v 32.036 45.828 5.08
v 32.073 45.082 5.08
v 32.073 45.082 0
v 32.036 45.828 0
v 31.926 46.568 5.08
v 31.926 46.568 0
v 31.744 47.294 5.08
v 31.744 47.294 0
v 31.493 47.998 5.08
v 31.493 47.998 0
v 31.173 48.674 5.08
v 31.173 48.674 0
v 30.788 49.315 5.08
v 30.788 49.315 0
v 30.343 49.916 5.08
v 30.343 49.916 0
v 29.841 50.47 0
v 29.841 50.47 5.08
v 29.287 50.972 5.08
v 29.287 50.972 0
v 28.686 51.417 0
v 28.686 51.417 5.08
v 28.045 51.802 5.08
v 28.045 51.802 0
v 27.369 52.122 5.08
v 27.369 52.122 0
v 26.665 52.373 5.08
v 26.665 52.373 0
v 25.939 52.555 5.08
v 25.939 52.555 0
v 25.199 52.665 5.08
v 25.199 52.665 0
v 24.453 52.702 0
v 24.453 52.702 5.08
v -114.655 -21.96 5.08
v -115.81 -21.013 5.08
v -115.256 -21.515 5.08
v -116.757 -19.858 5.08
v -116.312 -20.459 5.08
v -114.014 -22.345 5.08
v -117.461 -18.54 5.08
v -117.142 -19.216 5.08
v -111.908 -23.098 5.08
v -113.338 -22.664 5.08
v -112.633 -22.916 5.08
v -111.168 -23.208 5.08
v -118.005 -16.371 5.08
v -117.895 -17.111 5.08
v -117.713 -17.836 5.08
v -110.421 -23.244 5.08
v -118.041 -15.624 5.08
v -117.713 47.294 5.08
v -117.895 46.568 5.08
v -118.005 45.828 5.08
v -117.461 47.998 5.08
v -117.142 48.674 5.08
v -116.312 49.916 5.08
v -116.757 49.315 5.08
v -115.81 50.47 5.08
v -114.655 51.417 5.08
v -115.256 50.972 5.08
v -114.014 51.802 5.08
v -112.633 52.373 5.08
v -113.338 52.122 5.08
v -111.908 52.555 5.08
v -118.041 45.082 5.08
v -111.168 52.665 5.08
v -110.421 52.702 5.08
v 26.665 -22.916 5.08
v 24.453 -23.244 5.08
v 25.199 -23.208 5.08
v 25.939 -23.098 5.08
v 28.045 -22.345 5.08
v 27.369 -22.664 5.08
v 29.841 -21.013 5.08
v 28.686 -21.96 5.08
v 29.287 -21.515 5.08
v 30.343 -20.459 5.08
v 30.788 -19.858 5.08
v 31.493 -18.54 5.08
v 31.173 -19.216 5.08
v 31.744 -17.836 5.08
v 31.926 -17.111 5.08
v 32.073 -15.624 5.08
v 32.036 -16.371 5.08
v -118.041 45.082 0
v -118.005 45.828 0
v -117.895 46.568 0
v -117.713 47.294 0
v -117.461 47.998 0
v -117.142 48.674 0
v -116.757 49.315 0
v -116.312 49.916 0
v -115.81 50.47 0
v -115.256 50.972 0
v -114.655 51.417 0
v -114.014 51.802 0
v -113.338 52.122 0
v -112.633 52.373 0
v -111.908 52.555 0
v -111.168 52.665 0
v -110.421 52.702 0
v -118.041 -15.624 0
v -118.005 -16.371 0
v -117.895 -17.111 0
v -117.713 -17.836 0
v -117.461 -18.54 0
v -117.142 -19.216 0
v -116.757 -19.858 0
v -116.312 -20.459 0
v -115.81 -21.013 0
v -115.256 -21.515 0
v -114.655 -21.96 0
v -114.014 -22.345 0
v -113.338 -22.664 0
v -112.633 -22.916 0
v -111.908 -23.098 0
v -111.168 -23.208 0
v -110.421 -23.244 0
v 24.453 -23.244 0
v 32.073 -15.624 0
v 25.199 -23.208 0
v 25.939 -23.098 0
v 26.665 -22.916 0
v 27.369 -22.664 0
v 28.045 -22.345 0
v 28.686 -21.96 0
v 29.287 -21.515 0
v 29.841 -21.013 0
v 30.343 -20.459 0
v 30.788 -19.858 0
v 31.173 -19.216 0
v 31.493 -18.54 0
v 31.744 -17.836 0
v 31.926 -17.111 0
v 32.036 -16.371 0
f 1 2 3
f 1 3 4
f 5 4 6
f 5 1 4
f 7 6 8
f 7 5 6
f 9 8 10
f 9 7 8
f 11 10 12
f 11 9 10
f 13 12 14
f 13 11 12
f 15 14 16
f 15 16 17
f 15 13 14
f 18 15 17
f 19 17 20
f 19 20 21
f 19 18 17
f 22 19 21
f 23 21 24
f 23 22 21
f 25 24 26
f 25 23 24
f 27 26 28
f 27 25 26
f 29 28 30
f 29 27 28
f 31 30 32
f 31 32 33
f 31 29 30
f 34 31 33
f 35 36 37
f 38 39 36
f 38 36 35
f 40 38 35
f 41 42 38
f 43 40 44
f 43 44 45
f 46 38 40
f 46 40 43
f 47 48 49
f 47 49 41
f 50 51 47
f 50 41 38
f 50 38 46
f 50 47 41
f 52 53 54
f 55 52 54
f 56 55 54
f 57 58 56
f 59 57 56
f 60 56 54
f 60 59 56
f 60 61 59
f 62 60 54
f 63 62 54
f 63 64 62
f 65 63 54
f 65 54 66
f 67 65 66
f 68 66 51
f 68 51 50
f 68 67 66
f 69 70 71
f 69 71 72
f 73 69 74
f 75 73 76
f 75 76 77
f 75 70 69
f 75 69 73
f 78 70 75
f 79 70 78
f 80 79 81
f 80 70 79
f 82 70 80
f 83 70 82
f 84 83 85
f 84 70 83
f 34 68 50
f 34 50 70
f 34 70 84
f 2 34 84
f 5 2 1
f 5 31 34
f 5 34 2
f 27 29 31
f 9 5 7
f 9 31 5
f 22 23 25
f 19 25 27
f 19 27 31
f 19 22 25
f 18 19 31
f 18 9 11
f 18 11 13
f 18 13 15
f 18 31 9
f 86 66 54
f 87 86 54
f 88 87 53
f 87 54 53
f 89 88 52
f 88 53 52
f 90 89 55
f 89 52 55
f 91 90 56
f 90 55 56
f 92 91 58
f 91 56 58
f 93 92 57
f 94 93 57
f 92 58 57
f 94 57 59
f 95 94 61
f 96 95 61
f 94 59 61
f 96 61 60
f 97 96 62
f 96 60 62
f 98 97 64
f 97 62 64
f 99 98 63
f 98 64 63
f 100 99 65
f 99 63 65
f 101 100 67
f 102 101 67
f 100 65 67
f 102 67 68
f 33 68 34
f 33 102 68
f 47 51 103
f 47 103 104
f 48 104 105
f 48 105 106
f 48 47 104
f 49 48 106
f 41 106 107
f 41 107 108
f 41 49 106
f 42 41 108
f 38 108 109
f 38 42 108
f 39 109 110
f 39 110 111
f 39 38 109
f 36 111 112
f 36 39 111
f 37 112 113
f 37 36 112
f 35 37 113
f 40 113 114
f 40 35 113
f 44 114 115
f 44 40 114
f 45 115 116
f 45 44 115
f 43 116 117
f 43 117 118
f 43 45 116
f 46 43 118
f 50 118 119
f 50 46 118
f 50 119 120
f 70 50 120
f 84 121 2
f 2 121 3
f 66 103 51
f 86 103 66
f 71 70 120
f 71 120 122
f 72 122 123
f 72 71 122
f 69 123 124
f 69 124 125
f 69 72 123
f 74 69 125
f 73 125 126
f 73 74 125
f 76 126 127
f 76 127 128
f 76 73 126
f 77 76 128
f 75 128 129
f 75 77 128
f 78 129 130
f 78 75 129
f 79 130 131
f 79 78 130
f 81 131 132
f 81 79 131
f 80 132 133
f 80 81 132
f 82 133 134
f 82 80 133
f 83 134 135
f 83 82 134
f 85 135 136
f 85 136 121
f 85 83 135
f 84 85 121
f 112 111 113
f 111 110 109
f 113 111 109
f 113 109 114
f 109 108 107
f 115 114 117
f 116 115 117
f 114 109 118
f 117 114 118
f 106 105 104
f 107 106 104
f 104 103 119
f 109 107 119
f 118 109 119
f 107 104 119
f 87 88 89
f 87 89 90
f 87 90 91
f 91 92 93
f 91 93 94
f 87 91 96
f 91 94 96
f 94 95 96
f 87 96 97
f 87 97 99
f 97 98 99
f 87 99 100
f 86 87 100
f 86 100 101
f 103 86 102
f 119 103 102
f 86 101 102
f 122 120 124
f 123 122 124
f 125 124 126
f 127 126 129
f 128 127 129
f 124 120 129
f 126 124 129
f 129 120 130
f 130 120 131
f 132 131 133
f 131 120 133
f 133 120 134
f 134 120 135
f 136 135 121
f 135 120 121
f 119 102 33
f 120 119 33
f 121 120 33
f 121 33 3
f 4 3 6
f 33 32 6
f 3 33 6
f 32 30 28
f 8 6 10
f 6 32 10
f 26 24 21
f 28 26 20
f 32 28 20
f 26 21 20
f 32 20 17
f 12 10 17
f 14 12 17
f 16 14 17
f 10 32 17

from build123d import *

# Parameters (mm, degrees)
F0_W     = 150.114
F0_H     = 75.946
F1_DEPTH = 5.08
F2_R     = 7.62
F3_DEPTH = 2.54
F4_DEPTH = 2.54
F5_DEPTH = 5.08


with BuildPart() as f1:
    # F0 (on Top) → F1 (new body)
    with BuildSketch(Plane.XY):
        with Locations((-42.984459, 14.728555)):
            Rectangle(F0_W, F0_H)
    extrude(amount=F1_DEPTH)

    # F2
    f2_edges = [f1.edges().sort_by_distance(p)[0] for p in [
        (-118.041459, -23.244445, 2.54),
        (32.072541, -23.244445, 2.54),
        (32.072541, 52.701555, 2.54),
        (-118.041459, 52.701555, 2.54),
    ]]
    fillet(f2_edges, radius=F2_R)

    # F1_face (on face) → F3 (join)
    with BuildSketch(Plane(origin=(-42.984459, 14.728555, 5.08), x_dir=(1, 0, 0), z_dir=(0, 0, 1))):
        with BuildLine():
            Line((-67.437, -37.973), (67.437, -37.973))
            ThreePointArc((67.437, -37.973), (72.825154, -35.741154), (75.057, -30.353))
            Line((75.057, -30.353), (75.057, 30.353))
            ThreePointArc((75.057, 30.353), (72.825154, 35.741154), (67.437, 37.973))
            Line((67.437, 37.973), (-67.437, 37.973))
            ThreePointArc((-67.437, 37.973), (-72.825154, 35.741154), (-75.057, 30.353))
            Line((-75.057, 30.353), (-75.057, -30.353))
            ThreePointArc((-75.057, -30.353), (-72.825154, -35.741154), (-67.437, -37.973))
        make_face()
    extrude(amount=-F3_DEPTH)

    # F1_face (on face) → F4 (join)
    with BuildSketch(Plane(origin=(-42.984459, 14.728555, 5.08), x_dir=(1, 0, 0), z_dir=(0, 0, 1))):
        with BuildLine():
            Line((-67.437, -37.973), (67.437, -37.973))
            ThreePointArc((67.437, -37.973), (72.825154, -35.741154), (75.057, -30.353))
            Line((75.057, -30.353), (75.057, 30.353))
            ThreePointArc((75.057, 30.353), (72.825154, 35.741154), (67.437, 37.973))
            Line((67.437, 37.973), (-67.437, 37.973))
            ThreePointArc((-67.437, 37.973), (-72.825154, 35.741154), (-75.057, 30.353))
            Line((-75.057, 30.353), (-75.057, -30.353))
            ThreePointArc((-75.057, -30.353), (-72.825154, -35.741154), (-67.437, -37.973))
        make_face()
    extrude(amount=-F4_DEPTH)

    # F1_face (on face) → F5 (join)
    with BuildSketch(Plane(origin=(-42.984459, 14.728555, 5.08), x_dir=(1, 0, 0), z_dir=(0, 0, 1))):
        with BuildLine():
            Line((67.437, -37.973), (-67.437, -37.973))
            ThreePointArc((-67.437, -37.973), (-72.825154, -35.741154), (-75.057, -30.353))
            Line((-75.057, -30.353), (-75.057, 30.353))
            ThreePointArc((-75.057, 30.353), (-72.825154, 35.741154), (-67.437, 37.973))
            Line((-67.437, 37.973), (67.437, 37.973))
            ThreePointArc((67.437, 37.973), (72.825154, 35.741154), (75.057, 30.353))
            Line((75.057, 30.353), (75.057, -30.353))
            ThreePointArc((75.057, -30.353), (72.825154, -35.741154), (67.437, -37.973))
        make_face()
    extrude(amount=-F5_DEPTH)


solid = f1.part
